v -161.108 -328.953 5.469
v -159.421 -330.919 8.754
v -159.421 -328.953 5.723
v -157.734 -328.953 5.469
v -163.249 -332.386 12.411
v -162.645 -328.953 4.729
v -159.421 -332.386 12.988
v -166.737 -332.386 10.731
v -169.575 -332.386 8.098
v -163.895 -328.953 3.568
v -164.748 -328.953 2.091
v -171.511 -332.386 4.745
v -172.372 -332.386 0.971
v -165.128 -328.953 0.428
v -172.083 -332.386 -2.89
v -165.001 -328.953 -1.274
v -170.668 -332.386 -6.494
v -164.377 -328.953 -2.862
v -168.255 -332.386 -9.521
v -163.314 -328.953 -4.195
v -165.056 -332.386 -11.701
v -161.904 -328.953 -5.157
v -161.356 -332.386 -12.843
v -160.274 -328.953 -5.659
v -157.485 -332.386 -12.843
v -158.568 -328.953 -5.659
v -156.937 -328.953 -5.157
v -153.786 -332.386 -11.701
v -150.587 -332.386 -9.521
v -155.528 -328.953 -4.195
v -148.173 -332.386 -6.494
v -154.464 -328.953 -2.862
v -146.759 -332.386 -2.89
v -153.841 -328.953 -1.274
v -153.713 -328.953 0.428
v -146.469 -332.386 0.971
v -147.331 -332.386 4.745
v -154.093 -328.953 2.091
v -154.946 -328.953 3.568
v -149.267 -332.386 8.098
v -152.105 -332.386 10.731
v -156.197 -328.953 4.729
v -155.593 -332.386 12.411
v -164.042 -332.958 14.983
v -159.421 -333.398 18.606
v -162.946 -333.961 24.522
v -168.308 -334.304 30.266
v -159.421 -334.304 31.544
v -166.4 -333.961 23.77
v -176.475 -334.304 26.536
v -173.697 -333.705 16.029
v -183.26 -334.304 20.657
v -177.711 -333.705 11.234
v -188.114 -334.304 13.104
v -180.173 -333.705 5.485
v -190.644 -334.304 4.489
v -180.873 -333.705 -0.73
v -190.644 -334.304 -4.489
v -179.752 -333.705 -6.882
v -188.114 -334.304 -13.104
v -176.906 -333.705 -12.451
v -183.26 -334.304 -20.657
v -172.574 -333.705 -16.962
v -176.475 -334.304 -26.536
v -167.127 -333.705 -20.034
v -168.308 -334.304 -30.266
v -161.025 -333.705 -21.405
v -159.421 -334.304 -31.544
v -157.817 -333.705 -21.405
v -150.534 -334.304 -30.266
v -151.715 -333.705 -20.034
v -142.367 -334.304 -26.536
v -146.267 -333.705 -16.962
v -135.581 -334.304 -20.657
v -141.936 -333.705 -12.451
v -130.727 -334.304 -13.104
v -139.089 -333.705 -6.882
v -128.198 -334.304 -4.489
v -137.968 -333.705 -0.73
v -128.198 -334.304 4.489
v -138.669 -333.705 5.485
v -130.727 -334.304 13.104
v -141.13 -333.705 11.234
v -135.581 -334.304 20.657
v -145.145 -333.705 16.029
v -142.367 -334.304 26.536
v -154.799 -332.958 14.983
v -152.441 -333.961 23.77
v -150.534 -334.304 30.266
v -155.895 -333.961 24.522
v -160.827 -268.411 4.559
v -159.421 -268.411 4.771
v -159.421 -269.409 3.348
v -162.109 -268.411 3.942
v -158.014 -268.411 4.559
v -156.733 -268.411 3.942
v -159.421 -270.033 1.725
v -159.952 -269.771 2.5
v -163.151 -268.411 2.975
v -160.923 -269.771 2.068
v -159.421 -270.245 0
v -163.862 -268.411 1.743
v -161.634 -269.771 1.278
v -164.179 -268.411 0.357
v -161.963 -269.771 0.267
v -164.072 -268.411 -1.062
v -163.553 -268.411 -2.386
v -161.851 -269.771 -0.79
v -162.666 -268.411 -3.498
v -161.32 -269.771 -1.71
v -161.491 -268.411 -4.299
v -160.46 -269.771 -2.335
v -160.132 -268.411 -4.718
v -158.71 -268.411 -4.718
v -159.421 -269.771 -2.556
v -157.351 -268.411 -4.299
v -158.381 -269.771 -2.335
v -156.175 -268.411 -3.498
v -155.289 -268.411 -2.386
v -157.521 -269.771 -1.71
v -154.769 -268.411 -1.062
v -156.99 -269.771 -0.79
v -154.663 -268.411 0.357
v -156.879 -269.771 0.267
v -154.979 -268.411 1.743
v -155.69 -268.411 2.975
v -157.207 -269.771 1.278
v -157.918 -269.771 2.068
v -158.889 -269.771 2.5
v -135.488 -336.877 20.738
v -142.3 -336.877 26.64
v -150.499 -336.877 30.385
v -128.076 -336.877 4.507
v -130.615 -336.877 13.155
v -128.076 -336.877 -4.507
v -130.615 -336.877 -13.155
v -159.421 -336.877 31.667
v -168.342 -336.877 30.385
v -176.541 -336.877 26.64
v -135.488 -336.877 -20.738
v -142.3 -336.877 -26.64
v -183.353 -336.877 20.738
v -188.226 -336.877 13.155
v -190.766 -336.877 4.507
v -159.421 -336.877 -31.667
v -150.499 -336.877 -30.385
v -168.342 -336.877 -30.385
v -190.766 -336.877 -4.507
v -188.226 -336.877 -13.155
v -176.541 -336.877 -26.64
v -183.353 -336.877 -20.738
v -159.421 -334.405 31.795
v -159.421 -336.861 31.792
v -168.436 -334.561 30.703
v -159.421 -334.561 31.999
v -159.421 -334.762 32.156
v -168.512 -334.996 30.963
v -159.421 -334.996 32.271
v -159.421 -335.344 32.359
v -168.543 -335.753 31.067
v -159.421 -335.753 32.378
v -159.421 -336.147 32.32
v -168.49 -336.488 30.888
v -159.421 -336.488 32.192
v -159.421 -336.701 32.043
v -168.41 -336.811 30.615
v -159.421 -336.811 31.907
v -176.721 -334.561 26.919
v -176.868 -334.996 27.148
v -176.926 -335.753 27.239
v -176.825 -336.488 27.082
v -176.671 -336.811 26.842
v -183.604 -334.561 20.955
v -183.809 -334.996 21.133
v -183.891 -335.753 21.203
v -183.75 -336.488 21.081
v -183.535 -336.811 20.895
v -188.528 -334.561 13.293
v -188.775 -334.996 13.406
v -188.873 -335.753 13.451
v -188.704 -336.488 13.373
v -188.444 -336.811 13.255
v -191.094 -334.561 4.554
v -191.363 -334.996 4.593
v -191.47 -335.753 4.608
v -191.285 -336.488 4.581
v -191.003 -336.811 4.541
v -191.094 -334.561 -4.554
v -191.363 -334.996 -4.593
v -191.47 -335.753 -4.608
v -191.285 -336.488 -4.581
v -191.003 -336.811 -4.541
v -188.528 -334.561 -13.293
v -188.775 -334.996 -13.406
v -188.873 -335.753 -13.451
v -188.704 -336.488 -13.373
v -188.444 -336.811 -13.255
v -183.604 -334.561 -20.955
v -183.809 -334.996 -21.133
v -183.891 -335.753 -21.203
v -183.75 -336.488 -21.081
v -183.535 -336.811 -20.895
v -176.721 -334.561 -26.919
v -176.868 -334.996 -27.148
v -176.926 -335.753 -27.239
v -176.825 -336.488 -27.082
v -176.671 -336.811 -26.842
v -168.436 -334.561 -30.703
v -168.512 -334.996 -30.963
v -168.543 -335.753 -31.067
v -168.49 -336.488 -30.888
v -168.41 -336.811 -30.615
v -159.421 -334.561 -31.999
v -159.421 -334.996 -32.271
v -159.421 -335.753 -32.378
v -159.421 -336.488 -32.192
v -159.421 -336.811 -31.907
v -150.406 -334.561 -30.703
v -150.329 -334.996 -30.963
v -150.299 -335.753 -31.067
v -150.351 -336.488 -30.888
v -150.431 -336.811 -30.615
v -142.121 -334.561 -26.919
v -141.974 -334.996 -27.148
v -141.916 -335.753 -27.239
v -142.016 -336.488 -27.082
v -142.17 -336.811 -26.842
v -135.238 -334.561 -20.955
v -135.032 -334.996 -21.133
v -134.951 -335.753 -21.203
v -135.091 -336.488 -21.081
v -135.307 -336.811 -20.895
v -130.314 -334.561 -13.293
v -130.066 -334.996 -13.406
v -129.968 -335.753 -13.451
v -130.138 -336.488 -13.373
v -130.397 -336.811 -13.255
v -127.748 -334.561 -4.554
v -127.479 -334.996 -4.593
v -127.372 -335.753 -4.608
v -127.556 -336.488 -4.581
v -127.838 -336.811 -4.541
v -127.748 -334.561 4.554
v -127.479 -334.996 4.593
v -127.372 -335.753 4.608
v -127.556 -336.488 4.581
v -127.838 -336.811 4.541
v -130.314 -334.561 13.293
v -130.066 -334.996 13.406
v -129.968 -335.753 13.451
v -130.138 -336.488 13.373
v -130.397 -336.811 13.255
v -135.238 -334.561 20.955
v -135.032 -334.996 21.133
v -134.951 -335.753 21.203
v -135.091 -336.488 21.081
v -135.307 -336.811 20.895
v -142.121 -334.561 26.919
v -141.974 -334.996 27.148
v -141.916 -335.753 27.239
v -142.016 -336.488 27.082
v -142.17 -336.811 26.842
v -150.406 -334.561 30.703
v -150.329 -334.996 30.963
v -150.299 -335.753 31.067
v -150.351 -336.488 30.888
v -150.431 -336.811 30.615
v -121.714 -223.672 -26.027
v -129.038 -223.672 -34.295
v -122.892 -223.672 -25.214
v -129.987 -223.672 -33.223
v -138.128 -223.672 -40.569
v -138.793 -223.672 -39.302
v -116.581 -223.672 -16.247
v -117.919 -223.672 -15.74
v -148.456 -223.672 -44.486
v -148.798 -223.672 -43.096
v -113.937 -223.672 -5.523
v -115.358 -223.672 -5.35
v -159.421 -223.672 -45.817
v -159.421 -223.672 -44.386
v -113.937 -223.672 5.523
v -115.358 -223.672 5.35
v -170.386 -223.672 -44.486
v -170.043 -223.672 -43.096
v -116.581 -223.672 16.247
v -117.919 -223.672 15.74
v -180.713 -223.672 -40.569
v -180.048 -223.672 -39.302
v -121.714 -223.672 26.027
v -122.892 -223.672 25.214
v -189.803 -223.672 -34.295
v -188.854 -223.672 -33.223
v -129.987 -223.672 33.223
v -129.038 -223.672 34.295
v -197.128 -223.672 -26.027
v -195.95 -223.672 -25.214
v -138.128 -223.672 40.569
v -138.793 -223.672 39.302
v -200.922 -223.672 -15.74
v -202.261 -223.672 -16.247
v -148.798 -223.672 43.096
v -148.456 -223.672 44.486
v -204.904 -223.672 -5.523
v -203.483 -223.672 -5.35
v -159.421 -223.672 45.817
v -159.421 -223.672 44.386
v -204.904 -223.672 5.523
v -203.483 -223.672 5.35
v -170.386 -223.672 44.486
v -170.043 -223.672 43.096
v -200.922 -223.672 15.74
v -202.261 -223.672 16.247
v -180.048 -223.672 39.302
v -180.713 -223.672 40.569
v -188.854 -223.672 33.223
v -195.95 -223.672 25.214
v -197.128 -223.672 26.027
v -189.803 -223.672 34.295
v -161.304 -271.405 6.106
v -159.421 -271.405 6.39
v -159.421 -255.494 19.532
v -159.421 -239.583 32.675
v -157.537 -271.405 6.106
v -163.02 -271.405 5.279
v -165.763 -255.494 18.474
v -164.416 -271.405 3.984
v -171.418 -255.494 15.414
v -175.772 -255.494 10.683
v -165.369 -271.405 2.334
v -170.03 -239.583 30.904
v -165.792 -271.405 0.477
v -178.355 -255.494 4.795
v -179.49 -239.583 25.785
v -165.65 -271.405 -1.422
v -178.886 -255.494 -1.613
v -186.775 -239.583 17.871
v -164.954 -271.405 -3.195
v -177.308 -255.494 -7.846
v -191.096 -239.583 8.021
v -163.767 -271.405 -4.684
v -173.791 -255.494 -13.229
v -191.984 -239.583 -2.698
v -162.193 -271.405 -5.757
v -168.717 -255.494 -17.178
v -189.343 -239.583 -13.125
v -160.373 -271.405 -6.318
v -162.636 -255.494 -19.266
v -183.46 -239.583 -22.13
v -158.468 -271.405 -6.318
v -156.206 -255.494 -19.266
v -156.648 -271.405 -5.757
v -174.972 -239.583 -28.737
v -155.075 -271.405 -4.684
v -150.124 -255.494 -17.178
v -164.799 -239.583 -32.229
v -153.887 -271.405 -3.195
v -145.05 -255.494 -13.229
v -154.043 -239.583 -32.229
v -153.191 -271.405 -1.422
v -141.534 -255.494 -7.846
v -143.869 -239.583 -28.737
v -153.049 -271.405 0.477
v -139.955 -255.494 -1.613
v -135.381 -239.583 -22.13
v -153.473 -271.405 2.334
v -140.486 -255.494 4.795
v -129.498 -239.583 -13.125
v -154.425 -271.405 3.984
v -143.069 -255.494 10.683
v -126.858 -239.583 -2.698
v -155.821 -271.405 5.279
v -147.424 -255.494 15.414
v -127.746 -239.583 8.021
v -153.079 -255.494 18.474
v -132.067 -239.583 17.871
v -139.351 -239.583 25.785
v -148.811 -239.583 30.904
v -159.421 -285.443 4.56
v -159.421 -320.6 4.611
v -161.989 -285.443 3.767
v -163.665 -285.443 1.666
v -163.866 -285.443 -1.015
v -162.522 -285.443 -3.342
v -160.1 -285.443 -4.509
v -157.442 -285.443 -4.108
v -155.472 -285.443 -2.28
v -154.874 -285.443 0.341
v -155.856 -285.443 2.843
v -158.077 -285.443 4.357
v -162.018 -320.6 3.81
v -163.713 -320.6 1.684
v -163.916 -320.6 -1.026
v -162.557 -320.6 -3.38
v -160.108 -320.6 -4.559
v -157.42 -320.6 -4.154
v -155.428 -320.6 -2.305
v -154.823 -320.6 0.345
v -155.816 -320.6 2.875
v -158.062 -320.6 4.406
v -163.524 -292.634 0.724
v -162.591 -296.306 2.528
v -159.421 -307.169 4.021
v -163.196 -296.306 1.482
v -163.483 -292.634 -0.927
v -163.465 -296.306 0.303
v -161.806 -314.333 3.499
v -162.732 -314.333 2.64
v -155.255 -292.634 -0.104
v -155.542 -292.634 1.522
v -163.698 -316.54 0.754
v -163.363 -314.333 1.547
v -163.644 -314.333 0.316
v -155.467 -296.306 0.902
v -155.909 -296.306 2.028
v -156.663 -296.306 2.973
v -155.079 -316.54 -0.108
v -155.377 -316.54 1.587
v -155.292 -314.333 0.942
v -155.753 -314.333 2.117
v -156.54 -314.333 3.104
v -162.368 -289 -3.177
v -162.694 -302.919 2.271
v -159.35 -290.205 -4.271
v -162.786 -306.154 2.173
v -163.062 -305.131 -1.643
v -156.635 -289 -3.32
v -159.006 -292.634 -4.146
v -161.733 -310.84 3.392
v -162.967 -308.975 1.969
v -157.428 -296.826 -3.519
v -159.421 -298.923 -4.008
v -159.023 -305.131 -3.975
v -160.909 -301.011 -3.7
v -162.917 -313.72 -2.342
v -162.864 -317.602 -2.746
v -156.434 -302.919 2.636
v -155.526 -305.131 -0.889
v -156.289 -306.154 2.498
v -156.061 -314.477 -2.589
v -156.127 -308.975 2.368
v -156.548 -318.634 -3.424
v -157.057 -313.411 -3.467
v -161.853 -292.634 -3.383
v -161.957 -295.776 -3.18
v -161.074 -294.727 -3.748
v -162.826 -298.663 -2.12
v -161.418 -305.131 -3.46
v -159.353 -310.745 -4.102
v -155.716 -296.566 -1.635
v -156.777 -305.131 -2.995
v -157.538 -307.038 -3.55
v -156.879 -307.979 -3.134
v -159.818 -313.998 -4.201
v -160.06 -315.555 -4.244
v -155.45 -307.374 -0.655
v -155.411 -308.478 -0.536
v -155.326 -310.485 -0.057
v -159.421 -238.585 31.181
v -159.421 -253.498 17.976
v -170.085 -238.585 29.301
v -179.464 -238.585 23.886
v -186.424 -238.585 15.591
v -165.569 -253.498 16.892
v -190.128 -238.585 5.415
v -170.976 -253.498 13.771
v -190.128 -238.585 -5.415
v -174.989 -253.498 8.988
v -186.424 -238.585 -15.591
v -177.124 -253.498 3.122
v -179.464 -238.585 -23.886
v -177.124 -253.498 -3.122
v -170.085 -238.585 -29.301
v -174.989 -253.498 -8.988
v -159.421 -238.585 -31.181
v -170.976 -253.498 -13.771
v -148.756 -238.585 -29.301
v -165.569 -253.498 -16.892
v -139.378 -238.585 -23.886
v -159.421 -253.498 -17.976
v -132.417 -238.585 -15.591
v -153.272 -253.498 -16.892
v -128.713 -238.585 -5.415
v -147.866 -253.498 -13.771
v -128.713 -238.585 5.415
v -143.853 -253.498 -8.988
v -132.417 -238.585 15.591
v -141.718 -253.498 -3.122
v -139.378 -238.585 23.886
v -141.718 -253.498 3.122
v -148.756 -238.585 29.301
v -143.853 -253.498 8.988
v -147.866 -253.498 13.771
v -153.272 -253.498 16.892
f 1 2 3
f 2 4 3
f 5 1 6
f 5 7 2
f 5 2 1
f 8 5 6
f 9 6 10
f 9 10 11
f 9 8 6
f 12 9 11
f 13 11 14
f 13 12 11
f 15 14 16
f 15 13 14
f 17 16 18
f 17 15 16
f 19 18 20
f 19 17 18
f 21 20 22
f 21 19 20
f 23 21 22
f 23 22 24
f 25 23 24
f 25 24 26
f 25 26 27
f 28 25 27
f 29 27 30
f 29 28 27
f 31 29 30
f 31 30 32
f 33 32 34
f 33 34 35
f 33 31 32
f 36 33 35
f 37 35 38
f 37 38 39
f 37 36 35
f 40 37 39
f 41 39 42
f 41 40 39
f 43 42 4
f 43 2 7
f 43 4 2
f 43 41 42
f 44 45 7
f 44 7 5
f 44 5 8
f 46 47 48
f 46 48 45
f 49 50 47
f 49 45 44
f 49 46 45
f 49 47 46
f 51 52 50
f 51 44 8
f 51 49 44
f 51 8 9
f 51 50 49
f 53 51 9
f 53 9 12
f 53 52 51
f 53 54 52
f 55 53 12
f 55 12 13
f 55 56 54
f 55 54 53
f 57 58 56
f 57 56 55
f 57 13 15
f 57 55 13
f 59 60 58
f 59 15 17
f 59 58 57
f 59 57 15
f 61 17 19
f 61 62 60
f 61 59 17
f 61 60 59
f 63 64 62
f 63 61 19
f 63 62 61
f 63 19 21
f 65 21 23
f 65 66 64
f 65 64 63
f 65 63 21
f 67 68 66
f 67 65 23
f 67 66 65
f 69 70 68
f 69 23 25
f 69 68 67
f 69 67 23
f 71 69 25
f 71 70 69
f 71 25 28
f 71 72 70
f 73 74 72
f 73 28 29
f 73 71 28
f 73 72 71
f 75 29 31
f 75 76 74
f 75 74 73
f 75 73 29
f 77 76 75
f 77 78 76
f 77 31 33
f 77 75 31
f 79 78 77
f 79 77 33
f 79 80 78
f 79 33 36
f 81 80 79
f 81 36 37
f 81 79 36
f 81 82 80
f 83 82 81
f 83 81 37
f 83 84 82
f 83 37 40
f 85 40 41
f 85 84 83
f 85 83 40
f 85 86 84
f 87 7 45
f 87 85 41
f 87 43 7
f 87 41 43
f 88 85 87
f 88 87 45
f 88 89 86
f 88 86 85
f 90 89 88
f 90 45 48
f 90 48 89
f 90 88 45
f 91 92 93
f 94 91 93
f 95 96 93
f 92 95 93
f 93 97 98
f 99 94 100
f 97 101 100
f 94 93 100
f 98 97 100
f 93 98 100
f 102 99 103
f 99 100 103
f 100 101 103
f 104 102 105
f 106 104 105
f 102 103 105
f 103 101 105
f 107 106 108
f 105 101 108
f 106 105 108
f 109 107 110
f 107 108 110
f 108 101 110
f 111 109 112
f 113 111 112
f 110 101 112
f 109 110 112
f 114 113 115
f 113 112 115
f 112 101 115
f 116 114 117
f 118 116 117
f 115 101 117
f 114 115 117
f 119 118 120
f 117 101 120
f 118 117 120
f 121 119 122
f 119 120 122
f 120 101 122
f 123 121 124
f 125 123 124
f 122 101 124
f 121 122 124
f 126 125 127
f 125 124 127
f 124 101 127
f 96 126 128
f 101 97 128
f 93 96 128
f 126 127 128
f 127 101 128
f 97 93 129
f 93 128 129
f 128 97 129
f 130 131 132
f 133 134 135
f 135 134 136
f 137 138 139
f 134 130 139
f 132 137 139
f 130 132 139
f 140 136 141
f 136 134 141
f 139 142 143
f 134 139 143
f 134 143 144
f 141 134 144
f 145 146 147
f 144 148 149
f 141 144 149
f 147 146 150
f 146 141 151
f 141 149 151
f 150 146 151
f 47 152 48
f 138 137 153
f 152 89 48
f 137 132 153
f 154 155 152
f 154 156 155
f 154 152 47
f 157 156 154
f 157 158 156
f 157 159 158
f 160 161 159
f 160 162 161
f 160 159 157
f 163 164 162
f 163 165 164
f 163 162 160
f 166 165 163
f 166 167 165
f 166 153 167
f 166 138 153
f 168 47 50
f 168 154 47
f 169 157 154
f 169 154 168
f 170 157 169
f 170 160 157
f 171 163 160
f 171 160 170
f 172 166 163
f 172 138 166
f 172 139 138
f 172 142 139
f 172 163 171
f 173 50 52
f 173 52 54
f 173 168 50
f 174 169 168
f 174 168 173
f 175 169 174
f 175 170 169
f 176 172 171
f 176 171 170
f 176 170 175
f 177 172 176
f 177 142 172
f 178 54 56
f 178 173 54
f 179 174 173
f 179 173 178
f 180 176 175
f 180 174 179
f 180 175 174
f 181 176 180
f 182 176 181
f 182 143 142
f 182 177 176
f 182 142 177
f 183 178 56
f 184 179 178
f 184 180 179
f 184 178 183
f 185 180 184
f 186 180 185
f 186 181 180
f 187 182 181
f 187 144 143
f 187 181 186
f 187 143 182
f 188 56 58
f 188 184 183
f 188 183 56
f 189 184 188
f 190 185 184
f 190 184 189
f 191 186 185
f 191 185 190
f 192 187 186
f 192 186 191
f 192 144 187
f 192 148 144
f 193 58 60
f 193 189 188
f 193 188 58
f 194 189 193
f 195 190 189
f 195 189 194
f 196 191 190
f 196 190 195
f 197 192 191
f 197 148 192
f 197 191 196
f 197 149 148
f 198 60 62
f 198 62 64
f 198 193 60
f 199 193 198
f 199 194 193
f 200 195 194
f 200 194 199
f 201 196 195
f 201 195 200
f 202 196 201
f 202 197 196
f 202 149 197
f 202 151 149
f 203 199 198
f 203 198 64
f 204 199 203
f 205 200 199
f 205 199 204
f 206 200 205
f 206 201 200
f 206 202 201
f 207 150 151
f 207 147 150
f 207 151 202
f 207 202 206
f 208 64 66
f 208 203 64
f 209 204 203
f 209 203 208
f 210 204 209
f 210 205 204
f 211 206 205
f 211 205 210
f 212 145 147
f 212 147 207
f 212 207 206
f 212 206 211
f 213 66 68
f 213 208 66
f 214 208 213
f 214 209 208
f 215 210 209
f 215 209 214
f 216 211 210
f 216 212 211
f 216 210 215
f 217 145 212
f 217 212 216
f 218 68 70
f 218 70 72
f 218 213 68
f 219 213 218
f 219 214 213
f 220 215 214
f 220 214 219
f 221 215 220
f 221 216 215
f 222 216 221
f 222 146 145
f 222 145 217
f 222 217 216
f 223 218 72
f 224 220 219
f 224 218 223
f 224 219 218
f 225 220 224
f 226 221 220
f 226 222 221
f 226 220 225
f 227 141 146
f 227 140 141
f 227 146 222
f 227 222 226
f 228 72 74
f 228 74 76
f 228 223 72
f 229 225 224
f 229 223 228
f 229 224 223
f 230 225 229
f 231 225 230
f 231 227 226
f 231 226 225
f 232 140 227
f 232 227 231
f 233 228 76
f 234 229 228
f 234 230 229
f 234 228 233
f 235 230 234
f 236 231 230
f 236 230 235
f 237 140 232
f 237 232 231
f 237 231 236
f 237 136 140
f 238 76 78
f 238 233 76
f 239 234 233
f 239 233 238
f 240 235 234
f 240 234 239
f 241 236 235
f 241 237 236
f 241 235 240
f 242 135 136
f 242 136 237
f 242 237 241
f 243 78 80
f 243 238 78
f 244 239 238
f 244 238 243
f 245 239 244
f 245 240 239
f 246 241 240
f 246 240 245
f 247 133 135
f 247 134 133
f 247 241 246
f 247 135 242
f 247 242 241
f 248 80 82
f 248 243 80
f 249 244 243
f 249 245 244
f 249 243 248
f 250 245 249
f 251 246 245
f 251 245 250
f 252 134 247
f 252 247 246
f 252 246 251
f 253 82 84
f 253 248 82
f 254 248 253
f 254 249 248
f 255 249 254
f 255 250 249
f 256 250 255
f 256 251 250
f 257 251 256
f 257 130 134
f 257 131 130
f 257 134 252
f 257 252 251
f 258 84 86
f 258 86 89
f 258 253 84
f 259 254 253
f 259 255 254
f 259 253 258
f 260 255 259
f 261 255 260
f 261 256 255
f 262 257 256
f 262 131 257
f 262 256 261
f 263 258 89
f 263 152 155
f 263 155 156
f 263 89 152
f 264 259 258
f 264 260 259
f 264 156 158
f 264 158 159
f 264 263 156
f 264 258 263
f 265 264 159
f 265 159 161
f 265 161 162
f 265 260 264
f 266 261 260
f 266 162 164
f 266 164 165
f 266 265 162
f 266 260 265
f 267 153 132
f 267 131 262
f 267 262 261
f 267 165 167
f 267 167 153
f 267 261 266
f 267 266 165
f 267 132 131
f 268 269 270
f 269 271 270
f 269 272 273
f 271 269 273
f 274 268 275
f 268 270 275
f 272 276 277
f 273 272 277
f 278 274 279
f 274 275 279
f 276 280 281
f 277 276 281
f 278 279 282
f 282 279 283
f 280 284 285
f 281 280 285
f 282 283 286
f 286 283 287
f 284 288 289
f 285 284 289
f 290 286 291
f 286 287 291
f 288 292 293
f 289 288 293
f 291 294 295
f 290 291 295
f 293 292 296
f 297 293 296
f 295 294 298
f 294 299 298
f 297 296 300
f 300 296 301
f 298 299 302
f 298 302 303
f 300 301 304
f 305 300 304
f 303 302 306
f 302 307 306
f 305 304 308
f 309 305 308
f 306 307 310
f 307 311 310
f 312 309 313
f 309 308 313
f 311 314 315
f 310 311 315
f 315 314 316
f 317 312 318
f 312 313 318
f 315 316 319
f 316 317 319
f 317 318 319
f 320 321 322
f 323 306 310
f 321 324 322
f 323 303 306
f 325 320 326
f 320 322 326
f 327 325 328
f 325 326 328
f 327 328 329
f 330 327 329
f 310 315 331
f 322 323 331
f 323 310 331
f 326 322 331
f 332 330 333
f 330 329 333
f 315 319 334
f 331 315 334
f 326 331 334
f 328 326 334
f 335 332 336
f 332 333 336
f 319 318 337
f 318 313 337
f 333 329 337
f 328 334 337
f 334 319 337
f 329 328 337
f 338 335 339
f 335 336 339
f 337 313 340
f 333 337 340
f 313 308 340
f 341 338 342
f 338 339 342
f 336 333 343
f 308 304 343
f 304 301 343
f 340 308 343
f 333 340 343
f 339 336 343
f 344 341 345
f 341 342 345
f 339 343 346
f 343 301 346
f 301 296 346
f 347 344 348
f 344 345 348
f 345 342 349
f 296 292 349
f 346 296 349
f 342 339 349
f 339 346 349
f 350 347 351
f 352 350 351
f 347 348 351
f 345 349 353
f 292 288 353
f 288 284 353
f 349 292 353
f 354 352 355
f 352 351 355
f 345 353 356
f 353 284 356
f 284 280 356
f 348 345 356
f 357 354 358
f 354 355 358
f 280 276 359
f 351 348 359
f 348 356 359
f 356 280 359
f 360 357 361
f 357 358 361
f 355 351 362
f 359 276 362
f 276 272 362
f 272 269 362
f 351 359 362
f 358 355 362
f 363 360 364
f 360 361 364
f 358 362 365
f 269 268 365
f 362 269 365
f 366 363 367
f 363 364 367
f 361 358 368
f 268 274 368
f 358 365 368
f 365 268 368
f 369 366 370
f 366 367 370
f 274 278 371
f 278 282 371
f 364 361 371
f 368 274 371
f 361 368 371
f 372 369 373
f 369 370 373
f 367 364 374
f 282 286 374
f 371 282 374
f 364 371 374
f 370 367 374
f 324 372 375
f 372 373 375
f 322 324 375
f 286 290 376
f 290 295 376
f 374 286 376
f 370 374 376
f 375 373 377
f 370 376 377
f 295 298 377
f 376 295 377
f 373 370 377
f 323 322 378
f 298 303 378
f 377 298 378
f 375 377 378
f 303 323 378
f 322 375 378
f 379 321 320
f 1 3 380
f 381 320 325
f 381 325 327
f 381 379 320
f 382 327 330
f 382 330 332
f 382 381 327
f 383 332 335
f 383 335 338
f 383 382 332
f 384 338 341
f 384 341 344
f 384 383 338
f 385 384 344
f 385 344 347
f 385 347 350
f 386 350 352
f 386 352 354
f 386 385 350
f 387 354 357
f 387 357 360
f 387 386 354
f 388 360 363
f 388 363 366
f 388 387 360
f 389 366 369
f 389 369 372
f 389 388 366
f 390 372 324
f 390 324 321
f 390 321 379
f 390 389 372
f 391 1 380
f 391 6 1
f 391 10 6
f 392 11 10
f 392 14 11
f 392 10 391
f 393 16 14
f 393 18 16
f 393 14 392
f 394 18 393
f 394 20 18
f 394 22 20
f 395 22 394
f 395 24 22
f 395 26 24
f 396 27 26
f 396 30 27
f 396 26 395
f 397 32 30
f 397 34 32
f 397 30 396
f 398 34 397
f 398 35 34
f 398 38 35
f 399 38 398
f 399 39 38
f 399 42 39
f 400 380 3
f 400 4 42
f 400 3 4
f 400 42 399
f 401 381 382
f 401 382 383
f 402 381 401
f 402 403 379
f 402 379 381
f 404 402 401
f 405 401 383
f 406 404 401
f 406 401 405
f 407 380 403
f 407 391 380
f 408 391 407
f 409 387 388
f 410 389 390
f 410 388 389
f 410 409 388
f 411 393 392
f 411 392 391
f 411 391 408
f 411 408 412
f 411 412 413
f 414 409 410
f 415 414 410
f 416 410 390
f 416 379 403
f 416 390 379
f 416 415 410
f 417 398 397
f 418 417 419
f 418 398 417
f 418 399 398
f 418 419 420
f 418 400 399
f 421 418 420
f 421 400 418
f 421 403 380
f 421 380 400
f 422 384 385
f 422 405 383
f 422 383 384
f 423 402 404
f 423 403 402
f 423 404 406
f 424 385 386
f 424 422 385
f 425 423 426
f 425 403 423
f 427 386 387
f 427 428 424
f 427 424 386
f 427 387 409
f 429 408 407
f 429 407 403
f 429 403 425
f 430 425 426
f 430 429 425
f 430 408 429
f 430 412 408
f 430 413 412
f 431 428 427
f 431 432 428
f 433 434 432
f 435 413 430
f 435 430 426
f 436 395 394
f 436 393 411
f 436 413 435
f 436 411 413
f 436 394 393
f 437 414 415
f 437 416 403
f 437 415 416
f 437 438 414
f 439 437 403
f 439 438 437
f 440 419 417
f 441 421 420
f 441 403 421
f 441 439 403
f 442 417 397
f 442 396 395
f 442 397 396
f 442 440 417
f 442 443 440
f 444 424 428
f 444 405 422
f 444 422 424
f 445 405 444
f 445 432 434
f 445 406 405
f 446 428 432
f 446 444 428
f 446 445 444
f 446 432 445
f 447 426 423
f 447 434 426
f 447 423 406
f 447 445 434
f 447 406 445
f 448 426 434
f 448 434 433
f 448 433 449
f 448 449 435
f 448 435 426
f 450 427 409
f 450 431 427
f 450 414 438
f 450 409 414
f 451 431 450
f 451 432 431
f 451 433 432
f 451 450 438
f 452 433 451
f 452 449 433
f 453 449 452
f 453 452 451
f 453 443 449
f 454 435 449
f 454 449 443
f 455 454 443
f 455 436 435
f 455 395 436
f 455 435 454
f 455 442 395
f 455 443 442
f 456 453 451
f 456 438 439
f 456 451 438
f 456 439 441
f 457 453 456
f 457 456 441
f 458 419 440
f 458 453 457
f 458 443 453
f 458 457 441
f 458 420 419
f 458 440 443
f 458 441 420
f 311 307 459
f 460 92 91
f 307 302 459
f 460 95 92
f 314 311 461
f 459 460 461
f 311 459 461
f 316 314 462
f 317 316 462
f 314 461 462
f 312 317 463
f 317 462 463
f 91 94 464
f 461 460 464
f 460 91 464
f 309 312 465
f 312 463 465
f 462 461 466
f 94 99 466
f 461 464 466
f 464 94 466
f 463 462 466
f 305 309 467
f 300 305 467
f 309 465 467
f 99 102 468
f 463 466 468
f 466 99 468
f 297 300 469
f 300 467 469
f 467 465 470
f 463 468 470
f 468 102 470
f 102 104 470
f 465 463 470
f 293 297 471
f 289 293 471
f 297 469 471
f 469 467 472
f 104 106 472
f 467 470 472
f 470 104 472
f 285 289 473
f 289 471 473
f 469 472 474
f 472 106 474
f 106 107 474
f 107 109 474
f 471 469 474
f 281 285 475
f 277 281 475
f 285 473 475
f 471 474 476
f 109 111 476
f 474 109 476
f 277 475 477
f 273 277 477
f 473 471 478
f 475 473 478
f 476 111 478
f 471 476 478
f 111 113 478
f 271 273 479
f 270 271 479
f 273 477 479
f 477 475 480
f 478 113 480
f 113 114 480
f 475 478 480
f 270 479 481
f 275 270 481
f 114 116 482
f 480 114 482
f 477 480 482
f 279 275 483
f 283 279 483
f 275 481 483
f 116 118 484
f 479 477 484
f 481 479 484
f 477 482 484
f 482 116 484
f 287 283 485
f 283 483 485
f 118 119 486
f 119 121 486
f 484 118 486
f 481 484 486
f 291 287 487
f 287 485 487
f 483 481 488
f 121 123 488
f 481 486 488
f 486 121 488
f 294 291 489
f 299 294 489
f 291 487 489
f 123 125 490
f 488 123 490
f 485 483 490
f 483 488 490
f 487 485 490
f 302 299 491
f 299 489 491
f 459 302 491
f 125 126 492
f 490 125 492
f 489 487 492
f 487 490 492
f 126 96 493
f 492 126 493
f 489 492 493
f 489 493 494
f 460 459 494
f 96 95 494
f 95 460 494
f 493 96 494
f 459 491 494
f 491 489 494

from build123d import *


with BuildPart() as part:
    # Szkic1 → Obrót1 (revolve)
    with BuildSketch(Plane.XY, mode=Mode.PRIVATE) as obr_t1_sk:
        with BuildLine():
            Line((-159.420742679, -336.877488131), (-191.088174173, -336.877488131))
            add(Edge.make_bspline(
                [(-190.964645188, -334.304345553), (-192.193047533, -334.611123181), (-191.925483576, -336.882848477), (-191.088174173, -336.877488131)],
                knots=[0, 0, 0, 0, 0.19597938, 0.19597938, 0.19597938, 0.19597938], degree=3))
            add(Edge.make_bspline(
                [(-165.144069859, -328.953295048), (-169.837453966, -333.171753818), (-179.536145115, -333.828520522), (-190.964645188, -334.304345553)],
                knots=[0, 0, 0, 0, 0.834301138, 0.834301138, 0.834301138, 0.834301138], degree=3))
            add(Edge.make_bspline(
                [(-165.810340985, -271.404559169), (-162.204633443, -287.930293232), (-163.22774831, -321.791320533), (-165.144069859, -328.953295048)],
                knots=[0, 0, 0, 0, 1, 1, 1, 1], degree=3))
            Line((-165.810340985, -271.404559169), (-205.238115586, -223.671915039))
            Line((-205.238115586, -223.671915039), (-203.806854139, -223.671915039))
            Line((-203.806854139, -223.671915039), (-164.1921091, -268.411235001))
            ThreePointArc((-164.1921091, -268.411235001), (-161.976515627, -269.770631147), (-159.420742679, -270.244800904))
            Line((-159.420742679, -270.244800904), (-159.420742679, -336.877488131))
        make_face()
    revolve(obr_t1_sk.sketch.rotate(Axis((-159.420742679, -270.244800904, 0), (0, -1, 0)), 270), axis=Axis((-159.420742679, -270.244800904, 0), (0, -1, 0)))


solid = part.part
